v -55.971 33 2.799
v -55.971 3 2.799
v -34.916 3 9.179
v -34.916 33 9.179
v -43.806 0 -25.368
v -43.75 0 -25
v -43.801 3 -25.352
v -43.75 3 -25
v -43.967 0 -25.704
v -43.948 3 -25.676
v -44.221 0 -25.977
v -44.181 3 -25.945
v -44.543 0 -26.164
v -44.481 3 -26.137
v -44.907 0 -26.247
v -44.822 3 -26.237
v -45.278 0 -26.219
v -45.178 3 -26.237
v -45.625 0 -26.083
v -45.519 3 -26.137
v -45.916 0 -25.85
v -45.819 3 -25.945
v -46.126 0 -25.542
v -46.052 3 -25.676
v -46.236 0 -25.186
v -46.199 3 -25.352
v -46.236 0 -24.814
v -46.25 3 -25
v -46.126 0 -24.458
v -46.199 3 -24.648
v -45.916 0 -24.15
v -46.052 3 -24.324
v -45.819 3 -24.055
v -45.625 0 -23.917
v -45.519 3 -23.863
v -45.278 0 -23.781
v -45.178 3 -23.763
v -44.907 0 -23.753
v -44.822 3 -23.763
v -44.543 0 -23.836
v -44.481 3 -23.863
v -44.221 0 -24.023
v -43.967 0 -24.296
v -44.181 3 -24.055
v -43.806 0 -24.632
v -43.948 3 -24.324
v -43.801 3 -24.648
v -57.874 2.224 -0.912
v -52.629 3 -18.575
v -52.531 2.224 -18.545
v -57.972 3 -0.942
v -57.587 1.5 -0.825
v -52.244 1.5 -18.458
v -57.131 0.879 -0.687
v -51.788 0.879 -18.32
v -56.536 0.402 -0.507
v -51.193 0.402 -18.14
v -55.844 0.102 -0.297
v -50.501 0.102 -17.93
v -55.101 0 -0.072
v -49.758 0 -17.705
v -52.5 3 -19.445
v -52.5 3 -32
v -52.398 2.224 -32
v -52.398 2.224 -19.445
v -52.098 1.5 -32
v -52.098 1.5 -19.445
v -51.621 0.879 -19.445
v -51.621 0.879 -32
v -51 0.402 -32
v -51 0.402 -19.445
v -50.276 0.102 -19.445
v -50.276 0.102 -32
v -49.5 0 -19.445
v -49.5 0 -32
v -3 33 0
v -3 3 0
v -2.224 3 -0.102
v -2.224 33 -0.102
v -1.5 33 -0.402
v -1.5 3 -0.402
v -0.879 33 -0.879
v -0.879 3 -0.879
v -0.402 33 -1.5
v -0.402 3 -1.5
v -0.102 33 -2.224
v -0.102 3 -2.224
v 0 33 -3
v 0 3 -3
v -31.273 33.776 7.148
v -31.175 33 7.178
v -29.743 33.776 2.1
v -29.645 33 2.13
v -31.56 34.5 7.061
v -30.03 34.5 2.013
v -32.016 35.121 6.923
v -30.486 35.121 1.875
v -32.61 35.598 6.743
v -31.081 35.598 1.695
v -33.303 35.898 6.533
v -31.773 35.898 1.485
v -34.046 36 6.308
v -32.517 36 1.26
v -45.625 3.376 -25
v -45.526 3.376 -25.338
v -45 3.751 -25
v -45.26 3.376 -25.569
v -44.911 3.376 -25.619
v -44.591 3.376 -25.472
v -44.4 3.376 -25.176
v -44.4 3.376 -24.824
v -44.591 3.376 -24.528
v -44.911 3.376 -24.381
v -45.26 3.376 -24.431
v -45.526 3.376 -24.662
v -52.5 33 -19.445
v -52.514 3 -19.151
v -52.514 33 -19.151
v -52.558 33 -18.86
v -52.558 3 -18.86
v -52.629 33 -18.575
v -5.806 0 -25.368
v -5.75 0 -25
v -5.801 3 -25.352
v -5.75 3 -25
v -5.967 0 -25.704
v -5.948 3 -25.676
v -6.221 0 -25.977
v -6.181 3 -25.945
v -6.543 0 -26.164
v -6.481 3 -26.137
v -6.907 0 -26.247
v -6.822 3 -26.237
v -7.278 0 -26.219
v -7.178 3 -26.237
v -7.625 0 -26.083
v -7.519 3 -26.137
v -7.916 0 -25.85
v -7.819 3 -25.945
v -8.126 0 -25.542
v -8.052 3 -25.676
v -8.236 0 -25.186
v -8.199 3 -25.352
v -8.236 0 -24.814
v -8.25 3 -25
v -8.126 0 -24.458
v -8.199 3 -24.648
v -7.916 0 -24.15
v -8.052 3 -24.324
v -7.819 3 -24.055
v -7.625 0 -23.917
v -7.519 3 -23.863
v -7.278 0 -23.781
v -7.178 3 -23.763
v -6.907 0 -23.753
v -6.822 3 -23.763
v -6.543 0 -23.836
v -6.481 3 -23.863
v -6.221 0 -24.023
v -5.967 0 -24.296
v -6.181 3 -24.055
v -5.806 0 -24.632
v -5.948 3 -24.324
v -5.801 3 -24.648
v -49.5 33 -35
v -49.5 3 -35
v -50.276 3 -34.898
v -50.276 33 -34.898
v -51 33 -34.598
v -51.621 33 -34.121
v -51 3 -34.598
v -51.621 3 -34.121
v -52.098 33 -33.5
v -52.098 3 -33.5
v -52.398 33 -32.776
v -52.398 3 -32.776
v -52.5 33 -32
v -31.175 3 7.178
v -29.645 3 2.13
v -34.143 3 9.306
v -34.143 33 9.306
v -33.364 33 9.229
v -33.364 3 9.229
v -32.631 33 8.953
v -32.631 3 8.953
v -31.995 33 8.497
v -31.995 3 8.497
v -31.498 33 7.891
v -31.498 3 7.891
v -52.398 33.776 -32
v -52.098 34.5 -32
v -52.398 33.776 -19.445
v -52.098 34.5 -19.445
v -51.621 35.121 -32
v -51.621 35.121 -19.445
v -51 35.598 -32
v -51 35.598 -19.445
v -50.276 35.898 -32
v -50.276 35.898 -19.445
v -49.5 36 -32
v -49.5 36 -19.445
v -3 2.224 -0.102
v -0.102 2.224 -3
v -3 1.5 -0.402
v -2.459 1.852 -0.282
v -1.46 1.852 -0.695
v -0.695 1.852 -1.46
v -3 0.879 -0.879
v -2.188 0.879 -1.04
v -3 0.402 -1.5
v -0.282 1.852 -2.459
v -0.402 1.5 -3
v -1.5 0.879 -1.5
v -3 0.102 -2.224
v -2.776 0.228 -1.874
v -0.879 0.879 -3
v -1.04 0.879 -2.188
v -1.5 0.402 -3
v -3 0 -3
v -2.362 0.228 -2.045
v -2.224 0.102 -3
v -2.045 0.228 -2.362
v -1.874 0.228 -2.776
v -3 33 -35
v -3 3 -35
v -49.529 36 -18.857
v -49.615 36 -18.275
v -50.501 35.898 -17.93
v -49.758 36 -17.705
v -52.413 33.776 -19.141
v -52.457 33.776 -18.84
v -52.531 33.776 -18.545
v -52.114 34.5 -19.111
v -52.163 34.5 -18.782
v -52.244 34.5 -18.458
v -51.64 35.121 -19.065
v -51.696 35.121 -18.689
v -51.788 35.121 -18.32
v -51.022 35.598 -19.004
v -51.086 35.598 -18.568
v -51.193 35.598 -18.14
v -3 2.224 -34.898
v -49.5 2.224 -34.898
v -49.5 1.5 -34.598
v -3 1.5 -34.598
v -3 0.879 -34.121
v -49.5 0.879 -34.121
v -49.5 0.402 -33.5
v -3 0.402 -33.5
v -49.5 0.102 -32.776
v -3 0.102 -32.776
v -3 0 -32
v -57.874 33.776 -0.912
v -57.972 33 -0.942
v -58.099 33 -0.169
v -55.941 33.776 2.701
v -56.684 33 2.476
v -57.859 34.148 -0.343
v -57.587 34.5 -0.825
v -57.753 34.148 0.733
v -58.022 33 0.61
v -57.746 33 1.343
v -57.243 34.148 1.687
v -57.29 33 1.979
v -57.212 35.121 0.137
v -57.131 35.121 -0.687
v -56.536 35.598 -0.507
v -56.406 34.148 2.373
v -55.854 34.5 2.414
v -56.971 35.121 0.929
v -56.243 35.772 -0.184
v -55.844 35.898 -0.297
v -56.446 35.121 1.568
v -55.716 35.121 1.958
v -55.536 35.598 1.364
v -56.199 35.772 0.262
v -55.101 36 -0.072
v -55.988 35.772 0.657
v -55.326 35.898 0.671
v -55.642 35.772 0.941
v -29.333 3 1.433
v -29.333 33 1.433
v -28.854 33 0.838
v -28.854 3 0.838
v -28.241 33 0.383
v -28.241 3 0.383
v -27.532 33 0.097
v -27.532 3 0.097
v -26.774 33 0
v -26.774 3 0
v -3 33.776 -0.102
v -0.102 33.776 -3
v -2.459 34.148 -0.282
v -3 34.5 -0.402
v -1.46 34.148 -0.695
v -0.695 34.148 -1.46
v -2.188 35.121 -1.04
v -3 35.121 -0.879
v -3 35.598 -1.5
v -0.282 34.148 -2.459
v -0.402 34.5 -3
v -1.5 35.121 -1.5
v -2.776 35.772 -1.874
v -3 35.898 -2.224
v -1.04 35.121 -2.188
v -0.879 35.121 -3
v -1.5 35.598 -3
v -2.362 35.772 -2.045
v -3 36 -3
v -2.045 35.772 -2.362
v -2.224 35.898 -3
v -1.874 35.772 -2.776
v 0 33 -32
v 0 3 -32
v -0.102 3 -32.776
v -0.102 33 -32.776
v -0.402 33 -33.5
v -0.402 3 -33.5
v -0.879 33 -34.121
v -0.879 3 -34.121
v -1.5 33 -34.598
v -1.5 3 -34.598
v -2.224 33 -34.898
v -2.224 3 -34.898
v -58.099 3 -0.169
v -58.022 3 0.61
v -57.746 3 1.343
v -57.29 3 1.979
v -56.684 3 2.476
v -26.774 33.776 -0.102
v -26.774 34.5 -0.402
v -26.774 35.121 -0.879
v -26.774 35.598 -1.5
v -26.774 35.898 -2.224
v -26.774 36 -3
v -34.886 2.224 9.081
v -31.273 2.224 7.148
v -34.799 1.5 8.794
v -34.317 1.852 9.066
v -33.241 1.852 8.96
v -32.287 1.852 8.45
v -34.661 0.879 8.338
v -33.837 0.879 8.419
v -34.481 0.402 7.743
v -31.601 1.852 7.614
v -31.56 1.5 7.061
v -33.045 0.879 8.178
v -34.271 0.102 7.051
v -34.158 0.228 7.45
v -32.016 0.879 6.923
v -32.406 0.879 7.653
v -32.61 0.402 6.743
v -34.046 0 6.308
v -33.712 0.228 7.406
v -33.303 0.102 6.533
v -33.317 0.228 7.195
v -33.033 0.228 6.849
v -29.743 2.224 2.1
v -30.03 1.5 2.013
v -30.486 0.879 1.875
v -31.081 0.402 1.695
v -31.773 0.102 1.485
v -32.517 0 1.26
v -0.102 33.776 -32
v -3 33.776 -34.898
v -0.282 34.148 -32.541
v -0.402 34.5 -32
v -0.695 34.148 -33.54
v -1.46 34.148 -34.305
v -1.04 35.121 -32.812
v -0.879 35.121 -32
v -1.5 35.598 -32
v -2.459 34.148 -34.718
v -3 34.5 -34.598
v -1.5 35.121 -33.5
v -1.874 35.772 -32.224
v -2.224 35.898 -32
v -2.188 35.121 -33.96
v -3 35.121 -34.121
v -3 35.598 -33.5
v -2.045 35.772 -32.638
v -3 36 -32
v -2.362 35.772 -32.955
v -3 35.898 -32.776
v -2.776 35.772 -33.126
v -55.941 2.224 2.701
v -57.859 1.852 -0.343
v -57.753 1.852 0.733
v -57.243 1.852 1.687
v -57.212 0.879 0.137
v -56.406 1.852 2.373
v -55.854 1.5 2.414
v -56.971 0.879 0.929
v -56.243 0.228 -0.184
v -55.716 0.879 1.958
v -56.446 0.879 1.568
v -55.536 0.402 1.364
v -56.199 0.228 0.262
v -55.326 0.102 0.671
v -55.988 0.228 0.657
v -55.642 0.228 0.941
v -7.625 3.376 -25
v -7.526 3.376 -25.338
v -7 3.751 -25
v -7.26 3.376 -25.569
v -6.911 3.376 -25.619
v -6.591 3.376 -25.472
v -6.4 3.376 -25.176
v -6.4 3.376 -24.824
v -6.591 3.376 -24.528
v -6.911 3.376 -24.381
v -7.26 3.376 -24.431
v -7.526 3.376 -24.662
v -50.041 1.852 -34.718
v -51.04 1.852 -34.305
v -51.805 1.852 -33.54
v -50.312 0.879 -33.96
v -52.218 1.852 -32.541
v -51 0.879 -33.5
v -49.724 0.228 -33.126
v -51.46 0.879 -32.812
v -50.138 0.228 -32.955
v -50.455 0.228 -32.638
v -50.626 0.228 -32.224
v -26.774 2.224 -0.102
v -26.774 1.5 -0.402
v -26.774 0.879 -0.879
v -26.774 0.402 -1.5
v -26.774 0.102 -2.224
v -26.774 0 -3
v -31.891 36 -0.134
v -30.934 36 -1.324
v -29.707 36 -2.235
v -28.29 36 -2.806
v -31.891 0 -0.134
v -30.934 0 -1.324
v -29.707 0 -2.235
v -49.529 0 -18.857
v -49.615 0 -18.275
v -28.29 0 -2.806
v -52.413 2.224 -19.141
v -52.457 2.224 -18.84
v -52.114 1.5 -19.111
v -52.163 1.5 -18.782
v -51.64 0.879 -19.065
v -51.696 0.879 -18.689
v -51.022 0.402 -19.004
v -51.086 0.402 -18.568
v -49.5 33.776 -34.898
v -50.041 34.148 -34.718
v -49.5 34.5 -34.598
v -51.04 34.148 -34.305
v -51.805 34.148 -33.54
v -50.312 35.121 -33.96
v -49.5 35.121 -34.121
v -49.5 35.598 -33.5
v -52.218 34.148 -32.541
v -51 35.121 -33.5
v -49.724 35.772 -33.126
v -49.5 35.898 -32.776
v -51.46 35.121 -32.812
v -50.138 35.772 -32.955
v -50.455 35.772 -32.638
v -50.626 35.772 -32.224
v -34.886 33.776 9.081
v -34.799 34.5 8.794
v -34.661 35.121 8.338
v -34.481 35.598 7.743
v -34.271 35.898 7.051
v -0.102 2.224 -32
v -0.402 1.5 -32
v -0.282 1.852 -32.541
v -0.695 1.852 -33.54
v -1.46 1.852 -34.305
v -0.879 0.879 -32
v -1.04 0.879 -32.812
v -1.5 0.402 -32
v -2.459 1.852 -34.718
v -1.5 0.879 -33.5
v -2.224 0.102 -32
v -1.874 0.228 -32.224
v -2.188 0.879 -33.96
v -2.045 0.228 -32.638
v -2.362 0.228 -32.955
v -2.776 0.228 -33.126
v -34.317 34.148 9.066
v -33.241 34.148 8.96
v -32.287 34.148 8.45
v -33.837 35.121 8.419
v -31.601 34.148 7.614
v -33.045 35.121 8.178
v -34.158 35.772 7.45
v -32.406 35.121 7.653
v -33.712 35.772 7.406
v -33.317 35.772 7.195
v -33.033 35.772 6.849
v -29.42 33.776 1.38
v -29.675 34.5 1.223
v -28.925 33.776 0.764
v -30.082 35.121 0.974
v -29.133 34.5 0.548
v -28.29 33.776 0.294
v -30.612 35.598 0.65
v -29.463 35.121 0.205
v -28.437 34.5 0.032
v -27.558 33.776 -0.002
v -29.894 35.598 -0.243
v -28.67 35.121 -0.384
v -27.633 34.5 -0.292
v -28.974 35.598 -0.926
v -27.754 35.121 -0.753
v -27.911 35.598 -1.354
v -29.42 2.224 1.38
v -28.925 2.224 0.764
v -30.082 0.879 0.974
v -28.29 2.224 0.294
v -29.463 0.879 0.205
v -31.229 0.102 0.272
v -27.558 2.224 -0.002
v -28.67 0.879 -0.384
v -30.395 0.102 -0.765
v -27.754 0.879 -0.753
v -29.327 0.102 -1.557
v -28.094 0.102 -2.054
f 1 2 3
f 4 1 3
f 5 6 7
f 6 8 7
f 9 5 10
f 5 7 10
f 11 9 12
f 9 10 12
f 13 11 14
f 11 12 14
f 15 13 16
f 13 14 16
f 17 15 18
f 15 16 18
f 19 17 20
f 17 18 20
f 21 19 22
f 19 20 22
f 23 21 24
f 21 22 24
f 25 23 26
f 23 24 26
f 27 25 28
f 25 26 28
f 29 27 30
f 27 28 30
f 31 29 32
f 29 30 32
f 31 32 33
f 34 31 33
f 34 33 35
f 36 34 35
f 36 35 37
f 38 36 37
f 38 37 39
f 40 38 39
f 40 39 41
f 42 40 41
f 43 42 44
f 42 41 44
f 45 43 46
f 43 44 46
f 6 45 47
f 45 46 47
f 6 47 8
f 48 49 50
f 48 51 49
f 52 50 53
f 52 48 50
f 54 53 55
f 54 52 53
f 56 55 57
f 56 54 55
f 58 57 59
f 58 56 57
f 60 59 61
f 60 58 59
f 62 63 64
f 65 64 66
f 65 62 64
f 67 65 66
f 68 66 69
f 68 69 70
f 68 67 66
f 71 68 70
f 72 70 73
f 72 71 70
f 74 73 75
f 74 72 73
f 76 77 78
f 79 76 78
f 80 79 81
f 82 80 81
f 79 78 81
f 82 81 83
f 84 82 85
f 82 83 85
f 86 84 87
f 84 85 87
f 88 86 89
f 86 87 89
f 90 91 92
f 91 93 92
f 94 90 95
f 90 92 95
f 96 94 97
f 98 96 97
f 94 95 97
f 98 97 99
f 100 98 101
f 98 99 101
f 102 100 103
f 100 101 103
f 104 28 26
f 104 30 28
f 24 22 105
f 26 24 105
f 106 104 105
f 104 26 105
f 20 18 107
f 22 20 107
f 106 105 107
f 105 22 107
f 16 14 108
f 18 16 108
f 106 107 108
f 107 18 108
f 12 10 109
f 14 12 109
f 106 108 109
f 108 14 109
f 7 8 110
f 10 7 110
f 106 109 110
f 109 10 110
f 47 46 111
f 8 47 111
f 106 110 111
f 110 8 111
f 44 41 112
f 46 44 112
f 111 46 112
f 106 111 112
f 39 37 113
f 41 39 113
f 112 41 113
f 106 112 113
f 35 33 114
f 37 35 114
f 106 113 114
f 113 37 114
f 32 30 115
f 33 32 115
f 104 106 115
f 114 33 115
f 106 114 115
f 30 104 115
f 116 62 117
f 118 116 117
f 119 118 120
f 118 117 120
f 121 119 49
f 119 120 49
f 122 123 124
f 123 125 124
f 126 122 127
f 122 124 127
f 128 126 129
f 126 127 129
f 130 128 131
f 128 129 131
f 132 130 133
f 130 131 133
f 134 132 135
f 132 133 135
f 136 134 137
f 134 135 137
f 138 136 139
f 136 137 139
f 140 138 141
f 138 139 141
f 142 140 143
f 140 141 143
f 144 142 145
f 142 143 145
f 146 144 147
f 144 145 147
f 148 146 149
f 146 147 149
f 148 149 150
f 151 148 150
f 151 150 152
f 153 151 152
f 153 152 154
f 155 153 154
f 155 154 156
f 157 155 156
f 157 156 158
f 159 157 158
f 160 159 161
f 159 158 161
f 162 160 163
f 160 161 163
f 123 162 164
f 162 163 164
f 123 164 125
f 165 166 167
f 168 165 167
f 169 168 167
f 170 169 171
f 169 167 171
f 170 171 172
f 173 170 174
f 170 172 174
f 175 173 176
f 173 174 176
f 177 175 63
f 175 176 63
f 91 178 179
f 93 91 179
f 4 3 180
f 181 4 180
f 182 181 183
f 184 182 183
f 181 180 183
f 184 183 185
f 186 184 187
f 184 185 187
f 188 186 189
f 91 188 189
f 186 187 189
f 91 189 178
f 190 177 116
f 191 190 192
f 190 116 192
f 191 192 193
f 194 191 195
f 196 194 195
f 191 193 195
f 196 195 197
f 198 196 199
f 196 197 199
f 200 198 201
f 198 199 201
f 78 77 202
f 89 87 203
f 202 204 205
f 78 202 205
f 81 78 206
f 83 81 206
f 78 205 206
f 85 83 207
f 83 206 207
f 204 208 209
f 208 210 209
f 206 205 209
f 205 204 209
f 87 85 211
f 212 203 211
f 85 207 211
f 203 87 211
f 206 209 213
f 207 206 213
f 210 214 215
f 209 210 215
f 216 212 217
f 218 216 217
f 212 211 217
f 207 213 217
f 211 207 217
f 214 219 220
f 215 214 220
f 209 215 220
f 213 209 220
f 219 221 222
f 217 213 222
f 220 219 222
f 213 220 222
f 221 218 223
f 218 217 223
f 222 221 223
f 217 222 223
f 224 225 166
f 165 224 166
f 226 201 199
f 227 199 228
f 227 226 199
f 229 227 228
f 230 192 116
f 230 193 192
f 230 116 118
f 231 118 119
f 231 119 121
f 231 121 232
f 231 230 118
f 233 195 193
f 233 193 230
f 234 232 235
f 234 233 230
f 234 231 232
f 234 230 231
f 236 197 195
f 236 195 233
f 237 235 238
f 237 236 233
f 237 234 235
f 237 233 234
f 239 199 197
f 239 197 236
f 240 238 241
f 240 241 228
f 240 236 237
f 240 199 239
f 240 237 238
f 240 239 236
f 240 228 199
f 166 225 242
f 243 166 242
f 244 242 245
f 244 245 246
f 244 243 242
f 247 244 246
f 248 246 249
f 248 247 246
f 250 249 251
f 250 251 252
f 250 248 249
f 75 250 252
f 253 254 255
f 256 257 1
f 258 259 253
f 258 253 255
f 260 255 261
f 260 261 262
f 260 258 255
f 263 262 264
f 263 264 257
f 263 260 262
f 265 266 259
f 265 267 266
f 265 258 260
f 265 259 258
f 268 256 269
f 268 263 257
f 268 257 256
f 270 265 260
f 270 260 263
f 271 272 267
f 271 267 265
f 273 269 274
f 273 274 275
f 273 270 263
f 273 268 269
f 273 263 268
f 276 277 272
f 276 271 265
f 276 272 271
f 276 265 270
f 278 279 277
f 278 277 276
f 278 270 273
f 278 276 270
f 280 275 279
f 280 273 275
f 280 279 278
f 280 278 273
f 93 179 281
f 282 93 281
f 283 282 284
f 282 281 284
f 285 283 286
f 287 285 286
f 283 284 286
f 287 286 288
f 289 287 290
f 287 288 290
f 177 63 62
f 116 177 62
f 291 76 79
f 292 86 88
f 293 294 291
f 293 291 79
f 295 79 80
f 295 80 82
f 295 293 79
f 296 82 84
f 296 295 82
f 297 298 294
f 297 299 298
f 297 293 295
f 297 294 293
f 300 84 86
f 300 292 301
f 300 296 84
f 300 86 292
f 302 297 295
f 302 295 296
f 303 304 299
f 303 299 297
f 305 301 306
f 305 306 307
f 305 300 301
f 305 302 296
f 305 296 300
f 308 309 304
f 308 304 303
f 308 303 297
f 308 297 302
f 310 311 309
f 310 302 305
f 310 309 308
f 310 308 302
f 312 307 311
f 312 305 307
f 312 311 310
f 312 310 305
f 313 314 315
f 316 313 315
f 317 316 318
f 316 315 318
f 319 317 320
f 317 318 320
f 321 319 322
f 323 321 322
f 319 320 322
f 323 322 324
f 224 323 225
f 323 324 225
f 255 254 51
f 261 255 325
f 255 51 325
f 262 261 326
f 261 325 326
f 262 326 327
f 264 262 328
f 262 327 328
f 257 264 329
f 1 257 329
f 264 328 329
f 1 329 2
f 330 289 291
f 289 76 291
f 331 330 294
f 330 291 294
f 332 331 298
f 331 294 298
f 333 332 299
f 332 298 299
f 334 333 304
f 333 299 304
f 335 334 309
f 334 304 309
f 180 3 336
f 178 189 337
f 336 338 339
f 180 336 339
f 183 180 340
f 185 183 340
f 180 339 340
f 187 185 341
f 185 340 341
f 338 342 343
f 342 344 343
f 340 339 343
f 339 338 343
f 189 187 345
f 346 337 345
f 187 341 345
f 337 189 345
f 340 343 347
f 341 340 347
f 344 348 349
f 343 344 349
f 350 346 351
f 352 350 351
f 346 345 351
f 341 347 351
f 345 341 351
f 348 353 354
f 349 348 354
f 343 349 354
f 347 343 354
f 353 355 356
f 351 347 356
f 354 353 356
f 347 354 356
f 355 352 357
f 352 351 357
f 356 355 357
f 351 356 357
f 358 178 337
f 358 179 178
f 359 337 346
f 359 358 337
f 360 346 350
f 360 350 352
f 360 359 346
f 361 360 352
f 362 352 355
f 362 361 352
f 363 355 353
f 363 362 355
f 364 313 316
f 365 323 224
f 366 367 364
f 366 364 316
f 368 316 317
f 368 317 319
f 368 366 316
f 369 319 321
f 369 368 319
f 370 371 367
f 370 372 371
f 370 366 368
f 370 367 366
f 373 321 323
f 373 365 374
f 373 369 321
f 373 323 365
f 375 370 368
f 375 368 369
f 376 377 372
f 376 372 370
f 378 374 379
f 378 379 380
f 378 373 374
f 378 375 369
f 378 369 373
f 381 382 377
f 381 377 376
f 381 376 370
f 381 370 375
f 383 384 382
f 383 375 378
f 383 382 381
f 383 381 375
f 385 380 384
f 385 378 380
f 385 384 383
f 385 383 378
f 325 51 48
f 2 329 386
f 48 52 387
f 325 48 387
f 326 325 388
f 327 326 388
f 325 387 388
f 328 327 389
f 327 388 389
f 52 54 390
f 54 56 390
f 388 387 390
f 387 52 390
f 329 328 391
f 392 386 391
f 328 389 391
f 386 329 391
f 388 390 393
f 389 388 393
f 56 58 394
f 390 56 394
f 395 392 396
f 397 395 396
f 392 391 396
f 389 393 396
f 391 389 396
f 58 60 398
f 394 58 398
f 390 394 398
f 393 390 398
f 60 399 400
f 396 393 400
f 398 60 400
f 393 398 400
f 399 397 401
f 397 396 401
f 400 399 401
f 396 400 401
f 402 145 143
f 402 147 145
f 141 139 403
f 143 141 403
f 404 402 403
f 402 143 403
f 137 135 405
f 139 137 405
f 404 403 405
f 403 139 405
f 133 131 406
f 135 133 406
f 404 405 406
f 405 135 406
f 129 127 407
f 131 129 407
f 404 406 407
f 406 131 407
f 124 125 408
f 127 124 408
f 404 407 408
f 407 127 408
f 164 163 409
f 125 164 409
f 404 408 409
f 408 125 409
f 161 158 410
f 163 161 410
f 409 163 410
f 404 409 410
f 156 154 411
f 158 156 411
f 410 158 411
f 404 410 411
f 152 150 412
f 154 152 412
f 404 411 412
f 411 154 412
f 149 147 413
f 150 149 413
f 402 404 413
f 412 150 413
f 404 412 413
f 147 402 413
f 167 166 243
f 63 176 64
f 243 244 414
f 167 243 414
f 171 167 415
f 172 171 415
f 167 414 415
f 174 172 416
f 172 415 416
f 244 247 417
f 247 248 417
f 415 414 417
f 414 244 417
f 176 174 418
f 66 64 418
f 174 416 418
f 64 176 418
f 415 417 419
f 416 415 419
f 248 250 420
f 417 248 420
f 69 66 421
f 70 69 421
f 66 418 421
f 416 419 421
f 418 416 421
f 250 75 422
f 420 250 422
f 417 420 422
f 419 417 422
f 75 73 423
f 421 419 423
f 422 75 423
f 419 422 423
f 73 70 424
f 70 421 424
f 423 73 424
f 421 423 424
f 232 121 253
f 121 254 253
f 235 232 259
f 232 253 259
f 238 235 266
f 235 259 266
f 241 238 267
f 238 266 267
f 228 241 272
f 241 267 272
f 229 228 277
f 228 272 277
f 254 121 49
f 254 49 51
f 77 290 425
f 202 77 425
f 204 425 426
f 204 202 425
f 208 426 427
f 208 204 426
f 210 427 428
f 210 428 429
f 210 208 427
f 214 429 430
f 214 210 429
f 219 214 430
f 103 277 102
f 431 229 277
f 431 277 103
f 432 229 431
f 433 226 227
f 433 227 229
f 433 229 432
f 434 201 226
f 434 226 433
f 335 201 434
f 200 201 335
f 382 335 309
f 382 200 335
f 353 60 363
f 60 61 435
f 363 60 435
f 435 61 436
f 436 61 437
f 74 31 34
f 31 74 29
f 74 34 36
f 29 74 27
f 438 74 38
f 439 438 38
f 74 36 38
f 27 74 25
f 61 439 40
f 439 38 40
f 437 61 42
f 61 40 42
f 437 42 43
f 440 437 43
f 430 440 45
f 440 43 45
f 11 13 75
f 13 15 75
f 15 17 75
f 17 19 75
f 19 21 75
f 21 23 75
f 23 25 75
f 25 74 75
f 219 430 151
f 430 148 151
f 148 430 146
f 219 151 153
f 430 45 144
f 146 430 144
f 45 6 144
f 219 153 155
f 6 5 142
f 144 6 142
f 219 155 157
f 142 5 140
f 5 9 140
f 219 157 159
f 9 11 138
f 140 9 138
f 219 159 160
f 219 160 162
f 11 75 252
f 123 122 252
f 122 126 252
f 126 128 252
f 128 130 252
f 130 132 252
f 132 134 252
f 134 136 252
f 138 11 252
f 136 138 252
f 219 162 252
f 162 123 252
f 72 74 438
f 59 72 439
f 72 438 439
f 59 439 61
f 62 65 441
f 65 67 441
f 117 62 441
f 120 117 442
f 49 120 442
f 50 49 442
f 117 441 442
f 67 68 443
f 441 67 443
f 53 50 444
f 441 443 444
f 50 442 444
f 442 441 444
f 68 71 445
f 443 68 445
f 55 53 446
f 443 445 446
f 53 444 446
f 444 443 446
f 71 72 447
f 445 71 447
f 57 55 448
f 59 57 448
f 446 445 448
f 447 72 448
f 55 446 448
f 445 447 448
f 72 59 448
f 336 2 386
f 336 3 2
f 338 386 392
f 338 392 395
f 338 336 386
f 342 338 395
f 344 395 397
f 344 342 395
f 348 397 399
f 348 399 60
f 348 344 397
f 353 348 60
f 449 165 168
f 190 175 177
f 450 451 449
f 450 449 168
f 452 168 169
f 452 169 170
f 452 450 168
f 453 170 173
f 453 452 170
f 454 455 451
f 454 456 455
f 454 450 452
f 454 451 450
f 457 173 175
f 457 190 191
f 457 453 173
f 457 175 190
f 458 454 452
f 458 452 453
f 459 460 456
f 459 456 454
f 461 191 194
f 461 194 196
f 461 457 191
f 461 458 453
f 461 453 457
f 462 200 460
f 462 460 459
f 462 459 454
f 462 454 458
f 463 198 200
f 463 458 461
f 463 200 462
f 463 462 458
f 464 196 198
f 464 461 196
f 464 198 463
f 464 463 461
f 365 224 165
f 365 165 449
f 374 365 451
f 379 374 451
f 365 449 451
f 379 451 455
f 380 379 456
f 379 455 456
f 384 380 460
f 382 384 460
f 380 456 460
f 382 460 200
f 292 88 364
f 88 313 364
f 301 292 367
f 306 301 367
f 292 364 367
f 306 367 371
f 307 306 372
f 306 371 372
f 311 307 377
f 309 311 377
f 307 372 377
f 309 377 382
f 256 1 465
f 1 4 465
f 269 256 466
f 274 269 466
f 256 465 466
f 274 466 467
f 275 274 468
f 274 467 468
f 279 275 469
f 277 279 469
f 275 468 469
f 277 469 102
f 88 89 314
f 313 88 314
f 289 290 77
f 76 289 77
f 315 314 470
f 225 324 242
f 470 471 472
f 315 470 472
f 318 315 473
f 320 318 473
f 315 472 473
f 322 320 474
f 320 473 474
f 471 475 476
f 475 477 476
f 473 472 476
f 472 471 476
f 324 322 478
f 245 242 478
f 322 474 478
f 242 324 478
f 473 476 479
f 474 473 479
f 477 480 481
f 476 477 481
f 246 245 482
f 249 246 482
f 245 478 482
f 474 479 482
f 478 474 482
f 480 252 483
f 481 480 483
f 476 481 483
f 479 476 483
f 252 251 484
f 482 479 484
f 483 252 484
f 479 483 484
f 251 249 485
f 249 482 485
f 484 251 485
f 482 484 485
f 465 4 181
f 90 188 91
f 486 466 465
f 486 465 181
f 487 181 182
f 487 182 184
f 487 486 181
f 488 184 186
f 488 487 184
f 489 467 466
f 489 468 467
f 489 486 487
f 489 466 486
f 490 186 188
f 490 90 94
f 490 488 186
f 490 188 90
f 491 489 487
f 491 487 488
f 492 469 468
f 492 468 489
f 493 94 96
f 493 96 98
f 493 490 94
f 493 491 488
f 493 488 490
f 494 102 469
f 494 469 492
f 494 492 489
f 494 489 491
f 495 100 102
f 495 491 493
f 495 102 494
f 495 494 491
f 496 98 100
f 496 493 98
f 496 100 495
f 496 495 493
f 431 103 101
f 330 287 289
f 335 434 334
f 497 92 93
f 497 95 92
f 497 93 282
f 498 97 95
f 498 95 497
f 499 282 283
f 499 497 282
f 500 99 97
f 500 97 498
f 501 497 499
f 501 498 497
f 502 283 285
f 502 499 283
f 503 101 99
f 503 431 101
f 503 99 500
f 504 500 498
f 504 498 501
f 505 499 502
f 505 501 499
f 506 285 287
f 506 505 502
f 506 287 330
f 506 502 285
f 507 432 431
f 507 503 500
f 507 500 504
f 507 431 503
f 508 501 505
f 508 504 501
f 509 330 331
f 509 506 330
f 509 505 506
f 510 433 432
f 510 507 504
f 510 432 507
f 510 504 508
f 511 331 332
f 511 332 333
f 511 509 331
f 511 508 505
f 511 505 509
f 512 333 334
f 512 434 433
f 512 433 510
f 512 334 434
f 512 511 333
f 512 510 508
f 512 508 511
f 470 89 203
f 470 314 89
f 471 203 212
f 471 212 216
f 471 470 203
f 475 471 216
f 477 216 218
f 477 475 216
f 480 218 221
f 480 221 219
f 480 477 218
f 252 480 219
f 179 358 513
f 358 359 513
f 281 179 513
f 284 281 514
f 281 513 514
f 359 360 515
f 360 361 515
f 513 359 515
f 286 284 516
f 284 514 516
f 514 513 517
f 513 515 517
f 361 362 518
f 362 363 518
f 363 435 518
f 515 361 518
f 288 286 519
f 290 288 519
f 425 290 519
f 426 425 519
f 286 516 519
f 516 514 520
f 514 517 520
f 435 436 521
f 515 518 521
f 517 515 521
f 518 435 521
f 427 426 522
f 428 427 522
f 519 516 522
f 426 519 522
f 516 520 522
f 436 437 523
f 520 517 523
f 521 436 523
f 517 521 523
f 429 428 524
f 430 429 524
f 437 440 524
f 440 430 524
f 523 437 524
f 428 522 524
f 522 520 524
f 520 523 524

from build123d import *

# Parameters (mm, degrees)
BOSS_EXTRUDE1_DEPTH             = 36
FILLET1_R                       = 3
TAP_DRILL_FOR_M3X0_5_TAP1_D     = 2.5
TAP_DRILL_FOR_M3X0_5_TAP1_DEPTH = 3
TAP_DRILL_FOR_M3X0_5_TAP1_TIP   = 0.751075774


with BuildPart() as part:
    # Sketch1 → Boss-Extrude1 (new body)
    with BuildSketch(Plane(origin=(0, 0, 0), x_dir=(1, 0, 0), z_dir=(0, 1, 0))):
        with BuildLine():
            Line((0, 3), (0, 32))
            ThreePointArc((0, 32), (-0.878679656, 34.121320344), (-3, 35))
            Line((-3, 35), (-49.5, 35))
            ThreePointArc((-49.5, 35), (-51.621320344, 34.121320344), (-52.5, 32))
            Line((-52.5, 32), (-52.5, 19.444534932))
            ThreePointArc((-52.5, 19.444534932), (-52.53240259, 19.004801361), (-52.628910409, 18.574566795))
            Line((-52.628910409, 18.574566795), (-57.971756527, 0.941978638))
            ThreePointArc((-57.971756527, 0.941978638), (-57.745994224, -1.34299605), (-55.970635073, -2.799079091))
            Line((-55.970635073, -2.799079091), (-34.915978072, -9.178845431))
            ThreePointArc((-34.915978072, -9.178845431), (-32.631003385, -8.953083129), (-31.174920343, -7.177723978))
            Line((-31.174920343, -7.177723978), (-29.645420421, -2.130031863))
            ThreePointArc((-29.645420421, -2.130031863), (-28.561800492, -0.590653158), (-26.77433083, 0))
            Line((-26.77433083, 0), (-3, 0))
            ThreePointArc((-3, 0), (-0.878679656, 0.878679656), (0, 3))
        make_face()
    extrude(amount=BOSS_EXTRUDE1_DEPTH)

    # Fillet1
    fillet1_edges = [part.edges().sort_by_distance(p)[0] for p in [
        (-0.878679656, 36, -34.121320344),
        (-14.887165415, 0, 0),
        (-28.561800492, 0, 0.590653158),
        (-26.25, 36, -35),
        (-30.410170382, 0, 4.65387792),
        (-32.631003385, 0, 8.953083129),
        (-45.443306572, 0, 5.988962261),
        (-57.745994224, 0, 1.34299605),
        (-55.300333468, 0, -9.758272716),
        (-52.53240259, 0, -19.004801361),
        (-52.5, 0, -25.722267466),
        (-51.621320344, 36, -34.121320344),
        (-51.621320344, 0, -34.121320344),
        (-26.25, 0, -35),
        (-0.878679656, 0, -34.121320344),
        (0, 0, -17.5),
        (-0.878679656, 0, -0.878679656),
        (-52.5, 36, -25.722267466),
        (-52.53240259, 36, -19.004801361),
        (-55.300333468, 36, -9.758272716),
        (-57.745994224, 36, 1.34299605),
        (-45.443306572, 36, 5.988962261),
        (-32.631003385, 36, 8.953083129),
        (-30.410170382, 36, 4.65387792),
        (-0.878679656, 36, -0.878679656),
        (-28.561800492, 36, 0.590653158),
        (-14.887165415, 36, 0),
        (0, 36, -17.5),
    ]]
    fillet(fillet1_edges, radius=FILLET1_R)

    # Tap Drill for M3x0.5 Tap1
    with Locations(Plane(origin=(0, 0, 0), x_dir=(-1, 0, 0), z_dir=(0, -1, 0))):
        with Locations((7, 25), (45, 25)):
            Hole(TAP_DRILL_FOR_M3X0_5_TAP1_D / 2, depth=TAP_DRILL_FOR_M3X0_5_TAP1_DEPTH)
            with Locations((0, 0, -(TAP_DRILL_FOR_M3X0_5_TAP1_DEPTH + TAP_DRILL_FOR_M3X0_5_TAP1_TIP / 2))):  # 118° drill point
                Cone(0, TAP_DRILL_FOR_M3X0_5_TAP1_D / 2, TAP_DRILL_FOR_M3X0_5_TAP1_TIP, mode=Mode.SUBTRACT)


solid = part.part
